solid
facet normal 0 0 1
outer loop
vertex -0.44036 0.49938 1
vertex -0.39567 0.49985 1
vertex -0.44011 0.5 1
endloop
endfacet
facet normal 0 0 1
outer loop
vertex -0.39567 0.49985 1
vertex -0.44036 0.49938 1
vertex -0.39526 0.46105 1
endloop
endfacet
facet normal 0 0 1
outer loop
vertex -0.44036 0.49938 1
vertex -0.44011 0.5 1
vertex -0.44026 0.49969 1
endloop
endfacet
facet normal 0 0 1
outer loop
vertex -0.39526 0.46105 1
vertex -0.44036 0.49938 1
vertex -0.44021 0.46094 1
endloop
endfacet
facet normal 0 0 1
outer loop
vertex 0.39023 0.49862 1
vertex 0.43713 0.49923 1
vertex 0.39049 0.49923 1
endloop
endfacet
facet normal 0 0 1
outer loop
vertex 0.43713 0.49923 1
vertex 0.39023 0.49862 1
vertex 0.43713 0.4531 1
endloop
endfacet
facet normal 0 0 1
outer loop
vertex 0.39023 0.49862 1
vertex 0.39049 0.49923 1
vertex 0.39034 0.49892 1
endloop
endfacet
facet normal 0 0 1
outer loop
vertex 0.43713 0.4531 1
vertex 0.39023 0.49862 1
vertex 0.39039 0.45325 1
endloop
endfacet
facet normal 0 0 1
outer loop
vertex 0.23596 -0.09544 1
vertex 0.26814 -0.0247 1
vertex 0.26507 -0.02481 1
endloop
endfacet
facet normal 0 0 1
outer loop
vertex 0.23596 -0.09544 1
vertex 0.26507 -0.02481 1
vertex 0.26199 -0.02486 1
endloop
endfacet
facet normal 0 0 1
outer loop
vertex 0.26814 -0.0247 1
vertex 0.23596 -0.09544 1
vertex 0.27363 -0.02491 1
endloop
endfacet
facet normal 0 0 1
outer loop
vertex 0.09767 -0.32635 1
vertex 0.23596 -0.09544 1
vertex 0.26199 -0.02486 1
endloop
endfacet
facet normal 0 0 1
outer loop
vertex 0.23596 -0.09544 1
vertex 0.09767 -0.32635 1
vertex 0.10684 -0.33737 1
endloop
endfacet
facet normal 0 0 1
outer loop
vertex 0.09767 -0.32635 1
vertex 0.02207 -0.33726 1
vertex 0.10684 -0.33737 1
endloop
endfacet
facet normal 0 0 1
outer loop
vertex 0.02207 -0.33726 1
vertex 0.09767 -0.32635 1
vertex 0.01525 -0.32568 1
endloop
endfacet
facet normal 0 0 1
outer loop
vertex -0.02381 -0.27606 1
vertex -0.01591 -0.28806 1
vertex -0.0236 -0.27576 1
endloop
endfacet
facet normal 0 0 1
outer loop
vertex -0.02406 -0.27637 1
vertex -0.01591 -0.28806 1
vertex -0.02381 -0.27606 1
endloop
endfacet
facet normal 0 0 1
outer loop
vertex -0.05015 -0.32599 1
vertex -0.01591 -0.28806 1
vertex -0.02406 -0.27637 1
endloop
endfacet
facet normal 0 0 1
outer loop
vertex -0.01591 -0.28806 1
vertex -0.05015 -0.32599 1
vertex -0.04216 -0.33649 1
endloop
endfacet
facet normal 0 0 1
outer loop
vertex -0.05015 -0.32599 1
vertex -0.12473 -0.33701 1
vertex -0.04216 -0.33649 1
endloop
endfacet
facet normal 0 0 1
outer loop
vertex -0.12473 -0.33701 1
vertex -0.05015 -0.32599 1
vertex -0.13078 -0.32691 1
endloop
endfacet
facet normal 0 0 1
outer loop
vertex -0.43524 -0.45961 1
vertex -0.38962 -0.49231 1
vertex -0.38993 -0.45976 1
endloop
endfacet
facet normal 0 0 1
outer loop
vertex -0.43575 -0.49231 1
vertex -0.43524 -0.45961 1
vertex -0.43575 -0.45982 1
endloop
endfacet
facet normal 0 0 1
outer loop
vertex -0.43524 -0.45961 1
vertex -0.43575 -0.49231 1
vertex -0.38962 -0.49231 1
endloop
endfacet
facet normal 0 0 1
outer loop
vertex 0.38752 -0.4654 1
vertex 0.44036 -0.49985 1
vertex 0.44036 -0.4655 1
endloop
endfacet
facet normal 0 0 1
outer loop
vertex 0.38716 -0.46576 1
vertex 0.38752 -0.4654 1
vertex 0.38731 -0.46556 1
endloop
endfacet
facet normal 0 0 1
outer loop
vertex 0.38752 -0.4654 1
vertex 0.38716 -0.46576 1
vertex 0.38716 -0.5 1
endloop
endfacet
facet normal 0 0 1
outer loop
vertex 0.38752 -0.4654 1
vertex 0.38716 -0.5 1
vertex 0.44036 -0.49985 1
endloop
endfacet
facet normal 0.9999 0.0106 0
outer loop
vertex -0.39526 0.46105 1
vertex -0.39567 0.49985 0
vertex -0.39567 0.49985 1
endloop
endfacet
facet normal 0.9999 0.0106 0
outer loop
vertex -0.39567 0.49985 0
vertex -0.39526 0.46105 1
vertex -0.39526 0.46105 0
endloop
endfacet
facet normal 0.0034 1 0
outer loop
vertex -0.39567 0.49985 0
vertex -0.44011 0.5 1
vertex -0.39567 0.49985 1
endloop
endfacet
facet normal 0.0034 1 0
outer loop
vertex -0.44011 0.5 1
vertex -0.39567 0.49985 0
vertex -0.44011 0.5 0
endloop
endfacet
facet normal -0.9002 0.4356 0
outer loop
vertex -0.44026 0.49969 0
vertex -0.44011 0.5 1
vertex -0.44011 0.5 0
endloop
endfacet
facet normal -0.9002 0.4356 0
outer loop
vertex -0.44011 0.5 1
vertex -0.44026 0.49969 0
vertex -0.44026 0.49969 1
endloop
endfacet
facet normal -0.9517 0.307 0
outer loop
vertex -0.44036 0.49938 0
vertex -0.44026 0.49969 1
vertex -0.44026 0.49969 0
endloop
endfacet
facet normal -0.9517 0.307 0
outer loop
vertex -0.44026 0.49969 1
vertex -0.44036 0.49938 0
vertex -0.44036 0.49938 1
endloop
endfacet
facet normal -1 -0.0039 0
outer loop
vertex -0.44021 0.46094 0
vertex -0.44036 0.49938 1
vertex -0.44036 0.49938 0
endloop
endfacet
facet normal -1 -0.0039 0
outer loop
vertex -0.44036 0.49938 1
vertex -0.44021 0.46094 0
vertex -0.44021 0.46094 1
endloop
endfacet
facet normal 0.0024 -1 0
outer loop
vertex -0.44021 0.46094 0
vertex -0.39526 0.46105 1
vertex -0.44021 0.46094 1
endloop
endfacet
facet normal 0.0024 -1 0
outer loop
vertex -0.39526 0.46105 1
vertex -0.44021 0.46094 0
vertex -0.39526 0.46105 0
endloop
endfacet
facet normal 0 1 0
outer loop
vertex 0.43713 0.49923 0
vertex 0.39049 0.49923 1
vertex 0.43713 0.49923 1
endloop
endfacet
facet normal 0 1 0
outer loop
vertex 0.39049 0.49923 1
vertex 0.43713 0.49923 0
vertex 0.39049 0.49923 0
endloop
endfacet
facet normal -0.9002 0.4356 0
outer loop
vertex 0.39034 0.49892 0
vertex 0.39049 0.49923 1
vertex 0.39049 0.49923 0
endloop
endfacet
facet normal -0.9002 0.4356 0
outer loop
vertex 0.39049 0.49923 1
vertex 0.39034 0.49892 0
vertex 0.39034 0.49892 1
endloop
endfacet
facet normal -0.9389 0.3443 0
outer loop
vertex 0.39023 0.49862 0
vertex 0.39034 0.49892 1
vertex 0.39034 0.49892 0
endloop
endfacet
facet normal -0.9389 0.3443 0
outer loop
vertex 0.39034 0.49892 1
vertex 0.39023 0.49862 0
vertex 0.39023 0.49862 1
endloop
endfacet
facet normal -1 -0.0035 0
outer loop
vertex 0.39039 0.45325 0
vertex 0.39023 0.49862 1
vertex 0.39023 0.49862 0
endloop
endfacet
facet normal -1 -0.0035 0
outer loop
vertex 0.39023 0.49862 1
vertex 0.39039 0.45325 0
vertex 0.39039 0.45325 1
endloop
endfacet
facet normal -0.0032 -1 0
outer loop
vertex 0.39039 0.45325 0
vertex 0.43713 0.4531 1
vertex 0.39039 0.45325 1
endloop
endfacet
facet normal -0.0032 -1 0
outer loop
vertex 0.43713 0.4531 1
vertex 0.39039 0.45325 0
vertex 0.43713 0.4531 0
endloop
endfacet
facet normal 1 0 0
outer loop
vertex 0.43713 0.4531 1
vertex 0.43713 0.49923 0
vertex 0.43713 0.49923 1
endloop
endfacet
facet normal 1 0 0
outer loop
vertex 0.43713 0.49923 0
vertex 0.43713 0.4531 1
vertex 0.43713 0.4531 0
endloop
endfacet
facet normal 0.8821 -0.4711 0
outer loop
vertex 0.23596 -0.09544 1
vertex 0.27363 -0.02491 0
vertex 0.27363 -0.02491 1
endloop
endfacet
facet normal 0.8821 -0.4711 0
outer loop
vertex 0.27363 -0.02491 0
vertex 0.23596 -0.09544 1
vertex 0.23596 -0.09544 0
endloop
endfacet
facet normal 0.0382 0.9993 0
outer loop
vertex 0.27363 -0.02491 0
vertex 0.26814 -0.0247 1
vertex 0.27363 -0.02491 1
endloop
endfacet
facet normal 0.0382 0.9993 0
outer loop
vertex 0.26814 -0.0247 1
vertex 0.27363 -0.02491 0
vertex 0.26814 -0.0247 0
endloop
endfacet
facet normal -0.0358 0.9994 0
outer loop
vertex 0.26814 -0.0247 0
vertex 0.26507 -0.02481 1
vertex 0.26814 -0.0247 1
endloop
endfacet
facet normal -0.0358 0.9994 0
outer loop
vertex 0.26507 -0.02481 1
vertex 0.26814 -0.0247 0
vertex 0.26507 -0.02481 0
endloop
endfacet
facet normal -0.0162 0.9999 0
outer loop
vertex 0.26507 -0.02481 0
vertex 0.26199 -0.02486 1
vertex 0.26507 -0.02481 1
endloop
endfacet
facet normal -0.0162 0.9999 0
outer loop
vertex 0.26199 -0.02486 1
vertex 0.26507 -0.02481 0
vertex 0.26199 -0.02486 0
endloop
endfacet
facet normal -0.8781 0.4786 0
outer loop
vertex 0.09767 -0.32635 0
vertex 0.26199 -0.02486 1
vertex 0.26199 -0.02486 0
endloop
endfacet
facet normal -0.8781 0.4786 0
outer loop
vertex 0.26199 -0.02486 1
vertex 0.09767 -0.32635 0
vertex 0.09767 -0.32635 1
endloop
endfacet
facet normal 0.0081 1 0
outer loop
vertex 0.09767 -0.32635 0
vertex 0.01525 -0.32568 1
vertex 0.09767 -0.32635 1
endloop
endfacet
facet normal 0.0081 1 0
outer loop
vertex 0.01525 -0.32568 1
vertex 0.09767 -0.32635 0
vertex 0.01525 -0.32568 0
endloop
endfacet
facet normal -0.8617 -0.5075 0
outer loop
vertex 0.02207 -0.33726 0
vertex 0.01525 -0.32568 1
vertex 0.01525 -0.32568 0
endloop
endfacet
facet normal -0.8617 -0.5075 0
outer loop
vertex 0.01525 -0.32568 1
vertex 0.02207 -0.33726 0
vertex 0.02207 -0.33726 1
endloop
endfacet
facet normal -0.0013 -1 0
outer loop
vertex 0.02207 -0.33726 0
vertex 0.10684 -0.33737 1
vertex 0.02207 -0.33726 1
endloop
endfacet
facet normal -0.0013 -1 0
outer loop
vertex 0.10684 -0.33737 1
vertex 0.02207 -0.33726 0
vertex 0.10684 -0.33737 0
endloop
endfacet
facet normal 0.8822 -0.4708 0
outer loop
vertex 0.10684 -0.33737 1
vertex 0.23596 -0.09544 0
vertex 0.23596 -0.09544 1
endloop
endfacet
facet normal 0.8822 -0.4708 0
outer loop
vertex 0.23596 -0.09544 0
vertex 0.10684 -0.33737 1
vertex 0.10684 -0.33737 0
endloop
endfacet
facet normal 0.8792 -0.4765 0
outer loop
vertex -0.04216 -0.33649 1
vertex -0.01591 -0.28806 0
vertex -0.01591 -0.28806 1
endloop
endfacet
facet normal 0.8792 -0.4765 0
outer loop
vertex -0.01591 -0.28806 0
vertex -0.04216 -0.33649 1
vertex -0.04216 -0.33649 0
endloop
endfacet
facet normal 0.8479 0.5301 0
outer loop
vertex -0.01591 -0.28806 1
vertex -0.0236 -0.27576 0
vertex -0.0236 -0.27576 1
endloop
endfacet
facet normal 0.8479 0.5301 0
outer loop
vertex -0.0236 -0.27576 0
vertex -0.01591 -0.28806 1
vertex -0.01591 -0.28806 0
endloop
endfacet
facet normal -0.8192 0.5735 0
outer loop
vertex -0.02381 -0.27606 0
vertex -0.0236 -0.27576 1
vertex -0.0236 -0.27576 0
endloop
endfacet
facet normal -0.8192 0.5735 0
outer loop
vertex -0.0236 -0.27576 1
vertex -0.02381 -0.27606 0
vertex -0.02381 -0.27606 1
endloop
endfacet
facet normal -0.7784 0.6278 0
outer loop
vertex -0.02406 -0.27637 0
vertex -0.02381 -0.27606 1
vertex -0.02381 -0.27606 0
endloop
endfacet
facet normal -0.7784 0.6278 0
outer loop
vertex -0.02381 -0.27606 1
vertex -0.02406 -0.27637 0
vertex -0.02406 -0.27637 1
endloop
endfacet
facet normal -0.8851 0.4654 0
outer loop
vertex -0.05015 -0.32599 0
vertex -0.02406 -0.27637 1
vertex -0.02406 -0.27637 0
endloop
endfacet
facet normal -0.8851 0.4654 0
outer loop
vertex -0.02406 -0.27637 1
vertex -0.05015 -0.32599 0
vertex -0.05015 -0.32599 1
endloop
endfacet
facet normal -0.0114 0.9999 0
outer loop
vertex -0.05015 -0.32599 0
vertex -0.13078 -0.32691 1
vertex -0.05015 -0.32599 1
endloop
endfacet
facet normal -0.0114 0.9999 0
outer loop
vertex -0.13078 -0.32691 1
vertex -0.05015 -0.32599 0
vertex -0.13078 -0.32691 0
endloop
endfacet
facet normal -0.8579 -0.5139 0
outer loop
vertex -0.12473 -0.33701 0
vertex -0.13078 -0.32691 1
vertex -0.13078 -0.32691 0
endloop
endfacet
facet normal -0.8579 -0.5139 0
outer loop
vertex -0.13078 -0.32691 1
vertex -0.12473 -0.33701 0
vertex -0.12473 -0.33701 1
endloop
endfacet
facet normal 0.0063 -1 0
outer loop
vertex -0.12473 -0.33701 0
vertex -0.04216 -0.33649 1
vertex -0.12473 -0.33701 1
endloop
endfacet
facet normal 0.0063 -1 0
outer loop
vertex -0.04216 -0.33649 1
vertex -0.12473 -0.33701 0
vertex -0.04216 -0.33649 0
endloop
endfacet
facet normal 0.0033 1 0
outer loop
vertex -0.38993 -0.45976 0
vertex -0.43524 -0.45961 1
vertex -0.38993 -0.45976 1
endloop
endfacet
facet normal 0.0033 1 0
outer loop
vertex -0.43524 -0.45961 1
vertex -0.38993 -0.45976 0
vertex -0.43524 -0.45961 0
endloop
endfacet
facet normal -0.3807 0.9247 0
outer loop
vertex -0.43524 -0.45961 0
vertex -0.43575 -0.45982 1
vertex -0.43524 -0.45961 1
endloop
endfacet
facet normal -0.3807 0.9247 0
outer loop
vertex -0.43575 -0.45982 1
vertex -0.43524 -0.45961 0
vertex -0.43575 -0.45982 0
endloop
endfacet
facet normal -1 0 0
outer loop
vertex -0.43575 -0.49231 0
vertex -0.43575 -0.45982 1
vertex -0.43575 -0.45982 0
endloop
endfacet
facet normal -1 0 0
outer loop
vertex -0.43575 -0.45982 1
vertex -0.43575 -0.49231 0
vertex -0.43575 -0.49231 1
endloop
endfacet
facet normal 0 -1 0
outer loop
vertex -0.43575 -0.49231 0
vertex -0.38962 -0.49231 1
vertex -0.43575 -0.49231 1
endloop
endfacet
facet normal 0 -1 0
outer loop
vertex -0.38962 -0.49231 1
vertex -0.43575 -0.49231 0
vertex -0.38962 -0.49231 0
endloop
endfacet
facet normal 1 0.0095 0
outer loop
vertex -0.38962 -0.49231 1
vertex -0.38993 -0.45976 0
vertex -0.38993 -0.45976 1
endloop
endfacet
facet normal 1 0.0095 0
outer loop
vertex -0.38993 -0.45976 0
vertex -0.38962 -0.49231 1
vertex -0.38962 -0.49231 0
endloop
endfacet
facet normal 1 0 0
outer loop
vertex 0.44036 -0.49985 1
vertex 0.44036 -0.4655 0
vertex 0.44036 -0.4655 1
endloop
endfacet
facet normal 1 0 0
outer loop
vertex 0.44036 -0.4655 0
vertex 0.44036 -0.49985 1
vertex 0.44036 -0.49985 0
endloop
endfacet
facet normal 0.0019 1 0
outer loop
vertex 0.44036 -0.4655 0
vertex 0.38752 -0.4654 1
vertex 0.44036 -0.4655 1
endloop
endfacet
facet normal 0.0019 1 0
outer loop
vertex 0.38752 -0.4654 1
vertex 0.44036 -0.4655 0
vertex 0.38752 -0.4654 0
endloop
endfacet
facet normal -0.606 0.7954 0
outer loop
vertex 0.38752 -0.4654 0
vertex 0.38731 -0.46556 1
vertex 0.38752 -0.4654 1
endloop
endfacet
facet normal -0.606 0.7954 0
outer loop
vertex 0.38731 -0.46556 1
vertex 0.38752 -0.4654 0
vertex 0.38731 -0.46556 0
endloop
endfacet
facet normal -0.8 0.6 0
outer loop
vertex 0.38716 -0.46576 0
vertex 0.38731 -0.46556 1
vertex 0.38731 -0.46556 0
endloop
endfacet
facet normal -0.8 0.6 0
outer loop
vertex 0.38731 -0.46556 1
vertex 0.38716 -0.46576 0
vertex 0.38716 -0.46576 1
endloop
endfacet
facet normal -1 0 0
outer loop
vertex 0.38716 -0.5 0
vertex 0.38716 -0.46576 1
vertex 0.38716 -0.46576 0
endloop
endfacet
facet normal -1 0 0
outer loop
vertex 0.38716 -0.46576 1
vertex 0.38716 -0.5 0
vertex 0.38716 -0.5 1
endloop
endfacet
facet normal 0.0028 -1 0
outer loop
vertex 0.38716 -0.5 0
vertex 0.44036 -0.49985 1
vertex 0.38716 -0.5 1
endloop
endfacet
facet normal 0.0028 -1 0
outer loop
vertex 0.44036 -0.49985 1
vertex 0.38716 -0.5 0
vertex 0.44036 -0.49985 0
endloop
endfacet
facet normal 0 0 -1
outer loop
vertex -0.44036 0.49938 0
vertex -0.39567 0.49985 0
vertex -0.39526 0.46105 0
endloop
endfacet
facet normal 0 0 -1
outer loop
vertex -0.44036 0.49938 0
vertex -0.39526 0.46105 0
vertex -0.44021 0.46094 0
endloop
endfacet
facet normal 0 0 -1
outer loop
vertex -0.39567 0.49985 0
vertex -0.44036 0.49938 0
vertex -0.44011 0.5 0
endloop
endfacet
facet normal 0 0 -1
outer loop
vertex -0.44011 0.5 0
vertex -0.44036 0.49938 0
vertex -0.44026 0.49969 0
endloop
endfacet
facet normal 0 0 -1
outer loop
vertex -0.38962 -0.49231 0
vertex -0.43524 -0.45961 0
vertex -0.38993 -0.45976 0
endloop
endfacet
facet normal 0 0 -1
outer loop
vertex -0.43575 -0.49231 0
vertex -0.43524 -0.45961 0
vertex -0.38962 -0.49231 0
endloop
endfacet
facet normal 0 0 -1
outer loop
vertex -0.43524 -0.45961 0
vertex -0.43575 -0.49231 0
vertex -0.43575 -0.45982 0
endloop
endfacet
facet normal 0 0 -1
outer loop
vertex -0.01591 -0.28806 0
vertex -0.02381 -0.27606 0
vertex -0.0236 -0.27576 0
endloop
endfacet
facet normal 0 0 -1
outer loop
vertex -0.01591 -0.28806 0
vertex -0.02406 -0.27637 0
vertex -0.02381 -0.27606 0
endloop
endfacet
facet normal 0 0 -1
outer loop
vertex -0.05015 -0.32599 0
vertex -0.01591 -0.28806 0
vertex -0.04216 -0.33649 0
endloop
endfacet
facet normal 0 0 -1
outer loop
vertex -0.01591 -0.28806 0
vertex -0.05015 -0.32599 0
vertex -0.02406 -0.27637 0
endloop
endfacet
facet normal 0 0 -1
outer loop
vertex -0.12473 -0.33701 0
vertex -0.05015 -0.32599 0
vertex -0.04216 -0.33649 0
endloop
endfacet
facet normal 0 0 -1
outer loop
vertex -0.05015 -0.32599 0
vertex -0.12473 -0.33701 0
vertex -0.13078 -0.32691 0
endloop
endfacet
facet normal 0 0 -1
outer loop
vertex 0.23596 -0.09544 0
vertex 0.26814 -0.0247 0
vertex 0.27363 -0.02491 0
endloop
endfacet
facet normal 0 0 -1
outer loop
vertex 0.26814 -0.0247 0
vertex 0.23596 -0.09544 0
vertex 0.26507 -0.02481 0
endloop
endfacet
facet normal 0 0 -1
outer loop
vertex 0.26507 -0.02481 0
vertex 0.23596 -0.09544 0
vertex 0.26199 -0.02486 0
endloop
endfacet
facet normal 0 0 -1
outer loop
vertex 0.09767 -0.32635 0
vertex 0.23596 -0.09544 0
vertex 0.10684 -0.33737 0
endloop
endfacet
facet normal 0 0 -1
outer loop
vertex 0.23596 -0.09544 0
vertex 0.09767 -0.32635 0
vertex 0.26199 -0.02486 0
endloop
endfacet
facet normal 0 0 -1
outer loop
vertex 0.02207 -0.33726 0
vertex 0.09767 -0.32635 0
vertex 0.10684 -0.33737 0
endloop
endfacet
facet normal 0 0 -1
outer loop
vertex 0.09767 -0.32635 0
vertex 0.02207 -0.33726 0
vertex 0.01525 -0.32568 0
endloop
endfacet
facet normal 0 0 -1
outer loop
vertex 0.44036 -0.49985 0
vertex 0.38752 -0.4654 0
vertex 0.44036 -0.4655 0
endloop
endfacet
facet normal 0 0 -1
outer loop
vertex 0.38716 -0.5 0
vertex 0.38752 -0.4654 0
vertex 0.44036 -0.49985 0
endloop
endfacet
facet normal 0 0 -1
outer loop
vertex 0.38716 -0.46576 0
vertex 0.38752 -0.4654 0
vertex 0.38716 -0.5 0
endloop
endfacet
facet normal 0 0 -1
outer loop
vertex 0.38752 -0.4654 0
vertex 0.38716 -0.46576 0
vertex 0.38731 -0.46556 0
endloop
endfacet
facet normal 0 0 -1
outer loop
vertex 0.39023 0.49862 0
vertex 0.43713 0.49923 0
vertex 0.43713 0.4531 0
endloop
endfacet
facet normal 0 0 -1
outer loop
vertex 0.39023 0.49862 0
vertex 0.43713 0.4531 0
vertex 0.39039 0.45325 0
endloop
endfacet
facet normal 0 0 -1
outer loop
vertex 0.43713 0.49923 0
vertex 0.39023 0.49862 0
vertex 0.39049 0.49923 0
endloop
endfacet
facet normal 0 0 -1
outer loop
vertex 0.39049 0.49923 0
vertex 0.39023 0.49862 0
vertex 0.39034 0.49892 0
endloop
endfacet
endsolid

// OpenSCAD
module WibbyLowShadow_1()
{
 /* Generated by trace2scad version 20150415
    http://aggregate.org/MAKE/TRACE2SCAD/
    Optimized model has 41/374 original points
 */
 color([0.5, 0.5, 0.5])
 assign(minx=285) /* polygon minx=285 */
 assign(miny=200) /* polygon miny=200 */
 assign(maxx=17468) /* polygon maxx=17468 */
 assign(maxy=19710) /* polygon maxy=19710 */
 assign(dx=maxx-minx)
 assign(dy=maxy-miny)
 assign(maxd=((dx>dy)?dx:dy))
 scale([1/maxd, 1/maxd, 1])
 translate([-minx-dx/2, -miny-dy/2, 0])
 linear_extrude(height=1, convexity=41)
 union() {
  union() {
   polygon([[287,19704],[285,19698],[288,18948],[1165,18950],[1157,19707],[290,19710]], convexity=6);
   polygon([[16492,19689],[16490,19683],[16493,18798],[17405,18795],[17405,19695],[16495,19695]], convexity=6);
   polygon([[14048,9471],[13988,9470],[10782,3588],[9174,3601],[9307,3375],[10961,3373],[13480,8093],[14215,9469],[14108,9473]], convexity=7);
   polygon([[8412,4569],[8407,4563],[7898,3595],[6325,3577],[6443,3380],[8054,3390],[8566,4335],[8416,4575]], convexity=6);
   polygon([[380,986],[375,984],[375,350],[1275,350],[1269,985],[385,988]], convexity=6);
   polygon([[16433,872],[16430,868],[16430,200],[17468,203],[17468,873],[16437,875]], convexity=6);
  }
 }
}

module WibbyLowShadow()
{
 /* all layers combined, scaled to within a 1mm cube */
 scale([1, 1, 1/1])
 difference() {
  union() {
   scale([1,1,2]) translate([0,0,-0.5]) WibbyLowShadow_1();
  }
  translate([0,0,-2]) cube([2,2,4],center=true);
 }
}
WibbyLowShadow();
